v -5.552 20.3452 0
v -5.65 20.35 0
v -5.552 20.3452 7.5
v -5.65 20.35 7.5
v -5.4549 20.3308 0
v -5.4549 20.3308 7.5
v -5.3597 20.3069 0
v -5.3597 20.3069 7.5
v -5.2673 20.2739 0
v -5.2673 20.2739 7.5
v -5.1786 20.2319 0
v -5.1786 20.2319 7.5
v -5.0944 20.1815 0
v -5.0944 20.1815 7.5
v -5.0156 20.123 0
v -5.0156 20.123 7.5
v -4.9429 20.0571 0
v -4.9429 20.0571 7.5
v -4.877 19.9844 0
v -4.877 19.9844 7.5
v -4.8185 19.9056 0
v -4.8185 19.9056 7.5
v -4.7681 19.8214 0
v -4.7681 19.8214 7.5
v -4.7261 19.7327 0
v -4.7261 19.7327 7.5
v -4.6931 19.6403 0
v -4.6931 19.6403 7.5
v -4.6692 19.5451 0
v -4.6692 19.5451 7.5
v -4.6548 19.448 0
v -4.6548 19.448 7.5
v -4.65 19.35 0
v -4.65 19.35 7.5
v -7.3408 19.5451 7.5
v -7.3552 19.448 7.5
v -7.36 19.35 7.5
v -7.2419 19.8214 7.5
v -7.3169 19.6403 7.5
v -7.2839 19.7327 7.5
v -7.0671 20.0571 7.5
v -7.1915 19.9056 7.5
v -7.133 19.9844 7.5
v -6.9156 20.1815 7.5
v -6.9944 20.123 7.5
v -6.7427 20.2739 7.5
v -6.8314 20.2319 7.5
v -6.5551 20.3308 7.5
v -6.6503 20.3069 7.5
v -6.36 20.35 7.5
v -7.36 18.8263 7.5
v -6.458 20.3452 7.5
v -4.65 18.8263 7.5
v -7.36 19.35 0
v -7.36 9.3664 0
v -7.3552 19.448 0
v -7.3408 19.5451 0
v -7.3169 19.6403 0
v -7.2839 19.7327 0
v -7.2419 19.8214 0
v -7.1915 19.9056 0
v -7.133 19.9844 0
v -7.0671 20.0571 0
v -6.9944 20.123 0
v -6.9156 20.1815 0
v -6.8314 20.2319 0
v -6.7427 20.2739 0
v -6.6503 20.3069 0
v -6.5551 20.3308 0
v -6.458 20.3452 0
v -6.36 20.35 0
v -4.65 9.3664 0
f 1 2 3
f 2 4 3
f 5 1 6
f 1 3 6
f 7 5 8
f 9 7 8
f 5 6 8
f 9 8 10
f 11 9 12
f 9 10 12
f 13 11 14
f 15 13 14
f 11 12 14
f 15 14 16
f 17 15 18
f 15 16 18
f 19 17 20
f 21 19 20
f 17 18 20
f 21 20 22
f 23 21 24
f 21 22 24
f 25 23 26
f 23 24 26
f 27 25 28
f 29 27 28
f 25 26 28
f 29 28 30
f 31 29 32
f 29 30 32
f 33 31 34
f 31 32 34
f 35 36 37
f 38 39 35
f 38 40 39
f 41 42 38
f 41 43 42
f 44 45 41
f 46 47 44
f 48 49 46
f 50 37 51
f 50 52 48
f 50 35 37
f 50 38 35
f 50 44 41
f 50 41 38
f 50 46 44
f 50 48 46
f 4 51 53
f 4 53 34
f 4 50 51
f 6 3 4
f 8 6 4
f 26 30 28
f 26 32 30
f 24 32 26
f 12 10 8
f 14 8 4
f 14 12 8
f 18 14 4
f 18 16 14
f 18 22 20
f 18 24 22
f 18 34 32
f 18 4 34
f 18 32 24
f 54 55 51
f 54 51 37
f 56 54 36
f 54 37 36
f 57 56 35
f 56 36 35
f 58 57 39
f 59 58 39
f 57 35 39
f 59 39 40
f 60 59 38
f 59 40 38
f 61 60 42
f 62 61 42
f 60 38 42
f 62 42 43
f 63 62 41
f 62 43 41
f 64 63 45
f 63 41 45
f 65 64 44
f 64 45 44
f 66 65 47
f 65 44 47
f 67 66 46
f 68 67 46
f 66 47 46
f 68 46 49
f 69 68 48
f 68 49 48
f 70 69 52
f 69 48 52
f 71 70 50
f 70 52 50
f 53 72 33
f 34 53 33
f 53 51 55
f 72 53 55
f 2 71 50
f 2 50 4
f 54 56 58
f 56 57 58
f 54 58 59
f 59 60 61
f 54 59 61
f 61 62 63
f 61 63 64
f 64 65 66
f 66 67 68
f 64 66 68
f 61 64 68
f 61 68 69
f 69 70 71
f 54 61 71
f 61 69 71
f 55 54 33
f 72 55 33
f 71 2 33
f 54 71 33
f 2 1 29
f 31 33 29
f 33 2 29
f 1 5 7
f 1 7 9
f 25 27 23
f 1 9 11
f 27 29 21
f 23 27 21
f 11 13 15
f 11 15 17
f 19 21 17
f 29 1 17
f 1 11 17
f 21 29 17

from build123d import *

# Parameters (mm, degrees)
BOX001_W     = 2.71
BOX001_H     = 11
BOX001_DEPTH = 7.5
POCKET_DEPTH = 5
FILLET001_R  = 1


with BuildPart() as part:
    # Box001 → Box001 (new body)
    with BuildSketch(Plane(origin=(-7.36, 9.35, 0), x_dir=(1, 0, 0), z_dir=(0, 0, 1))):
        with Locations((1.355, 5.5)):
            Rectangle(BOX001_W, BOX001_H)
    extrude(amount=BOX001_DEPTH)

    # Sketch → Pocket (cut)
    with BuildSketch(Plane(origin=(-7.36, 9.35, 0), x_dir=(0, -1, 0), z_dir=(-1, 0, 0))):
        Polygon((-9.540607, 7.550952), (0.165381, -0.144127), (0.165381, 8.596624), align=None)
    extrude(amount=-POCKET_DEPTH, mode=Mode.SUBTRACT)

    # Fillet001
    fillet001_edges = [part.edges().sort_by_distance(p)[0] for p in [
        (-7.36, 20.35, 3.75),
        (-4.65, 20.35, 3.75),
    ]]
    fillet(fillet001_edges, radius=FILLET001_R)


solid = part.part
